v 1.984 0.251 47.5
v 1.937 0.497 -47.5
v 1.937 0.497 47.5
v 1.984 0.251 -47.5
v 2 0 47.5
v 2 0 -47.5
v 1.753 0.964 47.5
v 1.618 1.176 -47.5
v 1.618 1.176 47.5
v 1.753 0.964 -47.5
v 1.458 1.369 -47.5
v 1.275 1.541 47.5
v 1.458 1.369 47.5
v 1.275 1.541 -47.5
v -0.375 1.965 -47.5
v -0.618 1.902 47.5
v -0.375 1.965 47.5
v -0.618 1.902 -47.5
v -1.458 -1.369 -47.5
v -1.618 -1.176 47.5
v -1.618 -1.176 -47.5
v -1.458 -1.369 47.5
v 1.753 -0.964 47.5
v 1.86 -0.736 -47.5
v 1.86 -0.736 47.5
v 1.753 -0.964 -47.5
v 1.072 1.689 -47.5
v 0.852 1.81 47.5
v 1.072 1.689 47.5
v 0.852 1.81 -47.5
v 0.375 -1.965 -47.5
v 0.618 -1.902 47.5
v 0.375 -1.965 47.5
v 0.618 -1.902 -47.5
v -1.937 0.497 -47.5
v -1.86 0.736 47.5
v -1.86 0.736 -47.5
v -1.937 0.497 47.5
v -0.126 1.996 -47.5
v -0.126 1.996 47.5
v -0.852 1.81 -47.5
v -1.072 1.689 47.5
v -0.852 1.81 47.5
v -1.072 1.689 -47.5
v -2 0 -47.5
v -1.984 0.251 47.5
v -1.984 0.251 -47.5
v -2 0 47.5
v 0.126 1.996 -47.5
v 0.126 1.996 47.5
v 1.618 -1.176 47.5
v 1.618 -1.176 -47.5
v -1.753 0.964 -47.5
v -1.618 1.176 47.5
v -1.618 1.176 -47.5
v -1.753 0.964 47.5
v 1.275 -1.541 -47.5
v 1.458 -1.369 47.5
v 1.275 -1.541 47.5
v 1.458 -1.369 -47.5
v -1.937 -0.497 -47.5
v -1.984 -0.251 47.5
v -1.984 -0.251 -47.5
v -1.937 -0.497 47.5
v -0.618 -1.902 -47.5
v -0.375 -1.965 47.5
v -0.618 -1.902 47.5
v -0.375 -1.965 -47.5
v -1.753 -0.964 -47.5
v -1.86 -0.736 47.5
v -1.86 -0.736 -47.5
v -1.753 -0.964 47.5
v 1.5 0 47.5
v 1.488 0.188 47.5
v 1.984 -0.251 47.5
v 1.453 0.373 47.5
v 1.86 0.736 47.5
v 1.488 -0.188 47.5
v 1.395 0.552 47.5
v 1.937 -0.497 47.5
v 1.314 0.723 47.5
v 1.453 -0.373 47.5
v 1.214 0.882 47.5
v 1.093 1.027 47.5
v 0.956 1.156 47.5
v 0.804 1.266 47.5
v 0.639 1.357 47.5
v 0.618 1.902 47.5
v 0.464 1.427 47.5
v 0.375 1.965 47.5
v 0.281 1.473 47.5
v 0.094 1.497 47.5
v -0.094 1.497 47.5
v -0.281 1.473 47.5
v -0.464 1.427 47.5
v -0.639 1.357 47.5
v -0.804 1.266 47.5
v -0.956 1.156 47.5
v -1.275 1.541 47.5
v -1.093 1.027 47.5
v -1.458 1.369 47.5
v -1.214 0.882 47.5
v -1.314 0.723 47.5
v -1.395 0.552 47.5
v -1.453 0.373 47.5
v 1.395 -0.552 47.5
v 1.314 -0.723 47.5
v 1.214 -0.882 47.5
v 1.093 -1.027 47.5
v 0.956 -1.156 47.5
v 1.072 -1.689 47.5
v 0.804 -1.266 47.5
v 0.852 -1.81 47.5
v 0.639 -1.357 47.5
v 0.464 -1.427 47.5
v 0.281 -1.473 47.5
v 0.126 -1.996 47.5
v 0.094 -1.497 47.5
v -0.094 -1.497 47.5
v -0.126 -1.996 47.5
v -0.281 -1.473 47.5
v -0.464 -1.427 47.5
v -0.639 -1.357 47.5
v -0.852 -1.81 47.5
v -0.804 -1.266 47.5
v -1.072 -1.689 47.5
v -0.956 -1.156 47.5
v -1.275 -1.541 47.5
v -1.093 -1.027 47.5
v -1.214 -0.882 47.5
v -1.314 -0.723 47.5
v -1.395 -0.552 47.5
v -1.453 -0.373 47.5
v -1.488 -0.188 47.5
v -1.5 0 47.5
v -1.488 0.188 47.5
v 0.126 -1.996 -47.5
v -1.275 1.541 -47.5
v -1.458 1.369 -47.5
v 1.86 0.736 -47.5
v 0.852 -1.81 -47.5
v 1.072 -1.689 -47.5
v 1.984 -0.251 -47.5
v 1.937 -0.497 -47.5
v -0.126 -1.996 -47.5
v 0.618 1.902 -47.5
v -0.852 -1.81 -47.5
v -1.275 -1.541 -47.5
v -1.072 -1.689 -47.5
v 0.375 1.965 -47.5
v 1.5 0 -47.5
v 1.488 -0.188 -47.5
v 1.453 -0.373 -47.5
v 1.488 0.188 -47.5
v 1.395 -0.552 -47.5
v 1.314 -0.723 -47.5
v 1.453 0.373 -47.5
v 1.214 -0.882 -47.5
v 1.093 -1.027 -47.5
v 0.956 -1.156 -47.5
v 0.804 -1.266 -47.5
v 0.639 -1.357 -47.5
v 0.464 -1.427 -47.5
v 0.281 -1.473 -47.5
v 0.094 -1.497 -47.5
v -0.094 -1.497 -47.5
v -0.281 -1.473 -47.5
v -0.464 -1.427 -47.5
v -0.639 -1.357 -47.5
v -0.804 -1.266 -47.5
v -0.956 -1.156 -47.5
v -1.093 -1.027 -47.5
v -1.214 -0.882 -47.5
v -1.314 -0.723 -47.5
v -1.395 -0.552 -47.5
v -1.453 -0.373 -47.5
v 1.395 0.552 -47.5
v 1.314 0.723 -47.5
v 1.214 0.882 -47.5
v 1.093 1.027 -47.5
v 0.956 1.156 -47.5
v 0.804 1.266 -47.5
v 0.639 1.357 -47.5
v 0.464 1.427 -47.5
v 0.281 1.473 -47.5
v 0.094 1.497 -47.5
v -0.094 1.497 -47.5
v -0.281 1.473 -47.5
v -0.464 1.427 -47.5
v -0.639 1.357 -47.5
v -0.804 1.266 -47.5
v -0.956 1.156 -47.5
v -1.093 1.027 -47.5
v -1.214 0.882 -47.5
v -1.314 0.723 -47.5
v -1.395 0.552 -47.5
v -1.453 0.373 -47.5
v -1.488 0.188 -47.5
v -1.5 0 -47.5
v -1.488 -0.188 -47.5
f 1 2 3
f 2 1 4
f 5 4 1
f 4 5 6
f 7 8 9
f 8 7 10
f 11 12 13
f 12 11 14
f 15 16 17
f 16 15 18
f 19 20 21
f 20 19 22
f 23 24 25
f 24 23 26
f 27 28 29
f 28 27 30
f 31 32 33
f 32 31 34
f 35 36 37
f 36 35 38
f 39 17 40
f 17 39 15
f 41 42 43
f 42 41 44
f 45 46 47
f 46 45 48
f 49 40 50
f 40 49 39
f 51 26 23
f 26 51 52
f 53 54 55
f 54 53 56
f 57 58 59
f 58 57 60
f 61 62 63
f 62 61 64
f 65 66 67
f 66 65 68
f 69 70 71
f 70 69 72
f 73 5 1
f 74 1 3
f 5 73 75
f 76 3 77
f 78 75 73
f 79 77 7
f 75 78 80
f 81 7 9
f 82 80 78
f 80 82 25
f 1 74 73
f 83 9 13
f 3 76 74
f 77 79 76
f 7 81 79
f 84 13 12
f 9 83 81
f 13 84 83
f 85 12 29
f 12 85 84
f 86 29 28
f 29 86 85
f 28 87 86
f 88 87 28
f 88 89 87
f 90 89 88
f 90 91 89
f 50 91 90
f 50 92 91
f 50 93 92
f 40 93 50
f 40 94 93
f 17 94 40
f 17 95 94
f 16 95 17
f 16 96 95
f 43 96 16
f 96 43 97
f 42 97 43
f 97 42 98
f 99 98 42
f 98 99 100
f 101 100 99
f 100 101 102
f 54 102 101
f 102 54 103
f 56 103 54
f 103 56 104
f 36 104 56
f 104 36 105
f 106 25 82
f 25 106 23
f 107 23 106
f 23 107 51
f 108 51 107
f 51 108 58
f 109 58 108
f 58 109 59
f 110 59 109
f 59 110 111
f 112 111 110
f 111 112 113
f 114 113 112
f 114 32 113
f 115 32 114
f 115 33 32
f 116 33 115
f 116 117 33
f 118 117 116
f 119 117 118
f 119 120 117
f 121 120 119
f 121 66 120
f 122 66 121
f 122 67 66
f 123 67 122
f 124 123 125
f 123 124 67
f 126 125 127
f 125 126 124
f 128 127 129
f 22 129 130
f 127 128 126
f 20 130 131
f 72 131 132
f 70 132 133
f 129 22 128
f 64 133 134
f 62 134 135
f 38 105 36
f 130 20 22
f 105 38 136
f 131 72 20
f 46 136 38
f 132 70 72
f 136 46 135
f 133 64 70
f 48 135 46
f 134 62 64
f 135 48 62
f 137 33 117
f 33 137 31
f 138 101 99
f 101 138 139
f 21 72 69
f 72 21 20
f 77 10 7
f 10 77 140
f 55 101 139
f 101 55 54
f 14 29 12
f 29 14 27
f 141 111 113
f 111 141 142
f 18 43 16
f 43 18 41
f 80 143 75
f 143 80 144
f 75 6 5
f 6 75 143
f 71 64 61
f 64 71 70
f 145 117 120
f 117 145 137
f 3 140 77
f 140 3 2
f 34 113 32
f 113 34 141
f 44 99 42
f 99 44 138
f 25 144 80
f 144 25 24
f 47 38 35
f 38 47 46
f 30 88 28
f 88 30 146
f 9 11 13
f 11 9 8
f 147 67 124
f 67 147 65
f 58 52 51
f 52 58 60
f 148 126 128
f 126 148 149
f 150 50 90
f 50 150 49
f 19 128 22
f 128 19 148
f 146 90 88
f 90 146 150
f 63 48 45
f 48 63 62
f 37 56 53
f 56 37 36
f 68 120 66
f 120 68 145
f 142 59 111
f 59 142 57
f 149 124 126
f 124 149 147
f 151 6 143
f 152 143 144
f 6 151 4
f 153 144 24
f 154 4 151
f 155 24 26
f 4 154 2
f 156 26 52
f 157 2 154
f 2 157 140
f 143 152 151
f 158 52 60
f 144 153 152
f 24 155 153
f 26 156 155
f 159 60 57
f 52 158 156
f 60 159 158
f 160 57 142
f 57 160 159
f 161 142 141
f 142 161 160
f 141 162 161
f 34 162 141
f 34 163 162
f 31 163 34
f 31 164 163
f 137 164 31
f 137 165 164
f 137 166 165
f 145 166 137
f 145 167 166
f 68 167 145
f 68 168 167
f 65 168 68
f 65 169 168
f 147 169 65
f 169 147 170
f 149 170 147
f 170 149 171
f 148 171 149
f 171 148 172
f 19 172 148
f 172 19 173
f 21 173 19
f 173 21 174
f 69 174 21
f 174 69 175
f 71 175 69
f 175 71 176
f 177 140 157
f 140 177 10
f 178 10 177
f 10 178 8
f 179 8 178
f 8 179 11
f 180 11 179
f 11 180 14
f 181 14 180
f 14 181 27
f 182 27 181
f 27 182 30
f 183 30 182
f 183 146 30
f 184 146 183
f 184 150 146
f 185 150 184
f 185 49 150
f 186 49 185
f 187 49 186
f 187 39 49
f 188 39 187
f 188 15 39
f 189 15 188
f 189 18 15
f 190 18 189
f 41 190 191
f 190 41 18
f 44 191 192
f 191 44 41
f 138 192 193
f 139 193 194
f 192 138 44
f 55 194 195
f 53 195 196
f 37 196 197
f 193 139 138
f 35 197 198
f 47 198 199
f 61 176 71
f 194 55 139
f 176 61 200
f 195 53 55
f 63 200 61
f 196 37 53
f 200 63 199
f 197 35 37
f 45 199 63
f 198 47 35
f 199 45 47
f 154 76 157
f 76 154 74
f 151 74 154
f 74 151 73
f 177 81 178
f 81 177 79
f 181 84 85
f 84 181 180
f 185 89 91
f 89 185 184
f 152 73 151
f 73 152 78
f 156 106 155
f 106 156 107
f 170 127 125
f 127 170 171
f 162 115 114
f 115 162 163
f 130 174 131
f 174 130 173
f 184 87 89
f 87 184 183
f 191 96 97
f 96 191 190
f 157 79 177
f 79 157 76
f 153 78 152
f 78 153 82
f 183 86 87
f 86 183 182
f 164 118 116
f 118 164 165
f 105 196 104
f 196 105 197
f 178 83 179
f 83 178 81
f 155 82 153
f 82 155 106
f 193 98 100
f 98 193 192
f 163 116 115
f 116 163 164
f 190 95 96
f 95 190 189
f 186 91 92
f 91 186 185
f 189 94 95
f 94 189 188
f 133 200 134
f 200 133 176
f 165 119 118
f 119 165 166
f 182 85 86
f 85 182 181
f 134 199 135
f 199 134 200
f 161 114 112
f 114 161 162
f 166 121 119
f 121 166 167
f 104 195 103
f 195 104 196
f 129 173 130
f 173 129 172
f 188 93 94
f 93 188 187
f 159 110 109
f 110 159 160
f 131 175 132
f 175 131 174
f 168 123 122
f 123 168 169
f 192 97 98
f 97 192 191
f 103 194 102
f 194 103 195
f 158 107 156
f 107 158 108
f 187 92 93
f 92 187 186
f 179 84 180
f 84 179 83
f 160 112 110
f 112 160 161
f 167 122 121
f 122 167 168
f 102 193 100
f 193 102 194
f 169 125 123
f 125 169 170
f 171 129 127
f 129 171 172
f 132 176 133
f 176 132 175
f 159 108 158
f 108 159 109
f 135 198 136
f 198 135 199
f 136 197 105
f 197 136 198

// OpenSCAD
$fn = 50;


difference() {
	union() {
		translate(v = [0, 0, -47.5000000000]) {
			cylinder(h = 95, r = 2.0000000000);
		}
	}
	union() {
		translate(v = [0, 0, -100.0000000000]) {
			cylinder(h = 200, r = 1.5000000000);
		}
	}
}
